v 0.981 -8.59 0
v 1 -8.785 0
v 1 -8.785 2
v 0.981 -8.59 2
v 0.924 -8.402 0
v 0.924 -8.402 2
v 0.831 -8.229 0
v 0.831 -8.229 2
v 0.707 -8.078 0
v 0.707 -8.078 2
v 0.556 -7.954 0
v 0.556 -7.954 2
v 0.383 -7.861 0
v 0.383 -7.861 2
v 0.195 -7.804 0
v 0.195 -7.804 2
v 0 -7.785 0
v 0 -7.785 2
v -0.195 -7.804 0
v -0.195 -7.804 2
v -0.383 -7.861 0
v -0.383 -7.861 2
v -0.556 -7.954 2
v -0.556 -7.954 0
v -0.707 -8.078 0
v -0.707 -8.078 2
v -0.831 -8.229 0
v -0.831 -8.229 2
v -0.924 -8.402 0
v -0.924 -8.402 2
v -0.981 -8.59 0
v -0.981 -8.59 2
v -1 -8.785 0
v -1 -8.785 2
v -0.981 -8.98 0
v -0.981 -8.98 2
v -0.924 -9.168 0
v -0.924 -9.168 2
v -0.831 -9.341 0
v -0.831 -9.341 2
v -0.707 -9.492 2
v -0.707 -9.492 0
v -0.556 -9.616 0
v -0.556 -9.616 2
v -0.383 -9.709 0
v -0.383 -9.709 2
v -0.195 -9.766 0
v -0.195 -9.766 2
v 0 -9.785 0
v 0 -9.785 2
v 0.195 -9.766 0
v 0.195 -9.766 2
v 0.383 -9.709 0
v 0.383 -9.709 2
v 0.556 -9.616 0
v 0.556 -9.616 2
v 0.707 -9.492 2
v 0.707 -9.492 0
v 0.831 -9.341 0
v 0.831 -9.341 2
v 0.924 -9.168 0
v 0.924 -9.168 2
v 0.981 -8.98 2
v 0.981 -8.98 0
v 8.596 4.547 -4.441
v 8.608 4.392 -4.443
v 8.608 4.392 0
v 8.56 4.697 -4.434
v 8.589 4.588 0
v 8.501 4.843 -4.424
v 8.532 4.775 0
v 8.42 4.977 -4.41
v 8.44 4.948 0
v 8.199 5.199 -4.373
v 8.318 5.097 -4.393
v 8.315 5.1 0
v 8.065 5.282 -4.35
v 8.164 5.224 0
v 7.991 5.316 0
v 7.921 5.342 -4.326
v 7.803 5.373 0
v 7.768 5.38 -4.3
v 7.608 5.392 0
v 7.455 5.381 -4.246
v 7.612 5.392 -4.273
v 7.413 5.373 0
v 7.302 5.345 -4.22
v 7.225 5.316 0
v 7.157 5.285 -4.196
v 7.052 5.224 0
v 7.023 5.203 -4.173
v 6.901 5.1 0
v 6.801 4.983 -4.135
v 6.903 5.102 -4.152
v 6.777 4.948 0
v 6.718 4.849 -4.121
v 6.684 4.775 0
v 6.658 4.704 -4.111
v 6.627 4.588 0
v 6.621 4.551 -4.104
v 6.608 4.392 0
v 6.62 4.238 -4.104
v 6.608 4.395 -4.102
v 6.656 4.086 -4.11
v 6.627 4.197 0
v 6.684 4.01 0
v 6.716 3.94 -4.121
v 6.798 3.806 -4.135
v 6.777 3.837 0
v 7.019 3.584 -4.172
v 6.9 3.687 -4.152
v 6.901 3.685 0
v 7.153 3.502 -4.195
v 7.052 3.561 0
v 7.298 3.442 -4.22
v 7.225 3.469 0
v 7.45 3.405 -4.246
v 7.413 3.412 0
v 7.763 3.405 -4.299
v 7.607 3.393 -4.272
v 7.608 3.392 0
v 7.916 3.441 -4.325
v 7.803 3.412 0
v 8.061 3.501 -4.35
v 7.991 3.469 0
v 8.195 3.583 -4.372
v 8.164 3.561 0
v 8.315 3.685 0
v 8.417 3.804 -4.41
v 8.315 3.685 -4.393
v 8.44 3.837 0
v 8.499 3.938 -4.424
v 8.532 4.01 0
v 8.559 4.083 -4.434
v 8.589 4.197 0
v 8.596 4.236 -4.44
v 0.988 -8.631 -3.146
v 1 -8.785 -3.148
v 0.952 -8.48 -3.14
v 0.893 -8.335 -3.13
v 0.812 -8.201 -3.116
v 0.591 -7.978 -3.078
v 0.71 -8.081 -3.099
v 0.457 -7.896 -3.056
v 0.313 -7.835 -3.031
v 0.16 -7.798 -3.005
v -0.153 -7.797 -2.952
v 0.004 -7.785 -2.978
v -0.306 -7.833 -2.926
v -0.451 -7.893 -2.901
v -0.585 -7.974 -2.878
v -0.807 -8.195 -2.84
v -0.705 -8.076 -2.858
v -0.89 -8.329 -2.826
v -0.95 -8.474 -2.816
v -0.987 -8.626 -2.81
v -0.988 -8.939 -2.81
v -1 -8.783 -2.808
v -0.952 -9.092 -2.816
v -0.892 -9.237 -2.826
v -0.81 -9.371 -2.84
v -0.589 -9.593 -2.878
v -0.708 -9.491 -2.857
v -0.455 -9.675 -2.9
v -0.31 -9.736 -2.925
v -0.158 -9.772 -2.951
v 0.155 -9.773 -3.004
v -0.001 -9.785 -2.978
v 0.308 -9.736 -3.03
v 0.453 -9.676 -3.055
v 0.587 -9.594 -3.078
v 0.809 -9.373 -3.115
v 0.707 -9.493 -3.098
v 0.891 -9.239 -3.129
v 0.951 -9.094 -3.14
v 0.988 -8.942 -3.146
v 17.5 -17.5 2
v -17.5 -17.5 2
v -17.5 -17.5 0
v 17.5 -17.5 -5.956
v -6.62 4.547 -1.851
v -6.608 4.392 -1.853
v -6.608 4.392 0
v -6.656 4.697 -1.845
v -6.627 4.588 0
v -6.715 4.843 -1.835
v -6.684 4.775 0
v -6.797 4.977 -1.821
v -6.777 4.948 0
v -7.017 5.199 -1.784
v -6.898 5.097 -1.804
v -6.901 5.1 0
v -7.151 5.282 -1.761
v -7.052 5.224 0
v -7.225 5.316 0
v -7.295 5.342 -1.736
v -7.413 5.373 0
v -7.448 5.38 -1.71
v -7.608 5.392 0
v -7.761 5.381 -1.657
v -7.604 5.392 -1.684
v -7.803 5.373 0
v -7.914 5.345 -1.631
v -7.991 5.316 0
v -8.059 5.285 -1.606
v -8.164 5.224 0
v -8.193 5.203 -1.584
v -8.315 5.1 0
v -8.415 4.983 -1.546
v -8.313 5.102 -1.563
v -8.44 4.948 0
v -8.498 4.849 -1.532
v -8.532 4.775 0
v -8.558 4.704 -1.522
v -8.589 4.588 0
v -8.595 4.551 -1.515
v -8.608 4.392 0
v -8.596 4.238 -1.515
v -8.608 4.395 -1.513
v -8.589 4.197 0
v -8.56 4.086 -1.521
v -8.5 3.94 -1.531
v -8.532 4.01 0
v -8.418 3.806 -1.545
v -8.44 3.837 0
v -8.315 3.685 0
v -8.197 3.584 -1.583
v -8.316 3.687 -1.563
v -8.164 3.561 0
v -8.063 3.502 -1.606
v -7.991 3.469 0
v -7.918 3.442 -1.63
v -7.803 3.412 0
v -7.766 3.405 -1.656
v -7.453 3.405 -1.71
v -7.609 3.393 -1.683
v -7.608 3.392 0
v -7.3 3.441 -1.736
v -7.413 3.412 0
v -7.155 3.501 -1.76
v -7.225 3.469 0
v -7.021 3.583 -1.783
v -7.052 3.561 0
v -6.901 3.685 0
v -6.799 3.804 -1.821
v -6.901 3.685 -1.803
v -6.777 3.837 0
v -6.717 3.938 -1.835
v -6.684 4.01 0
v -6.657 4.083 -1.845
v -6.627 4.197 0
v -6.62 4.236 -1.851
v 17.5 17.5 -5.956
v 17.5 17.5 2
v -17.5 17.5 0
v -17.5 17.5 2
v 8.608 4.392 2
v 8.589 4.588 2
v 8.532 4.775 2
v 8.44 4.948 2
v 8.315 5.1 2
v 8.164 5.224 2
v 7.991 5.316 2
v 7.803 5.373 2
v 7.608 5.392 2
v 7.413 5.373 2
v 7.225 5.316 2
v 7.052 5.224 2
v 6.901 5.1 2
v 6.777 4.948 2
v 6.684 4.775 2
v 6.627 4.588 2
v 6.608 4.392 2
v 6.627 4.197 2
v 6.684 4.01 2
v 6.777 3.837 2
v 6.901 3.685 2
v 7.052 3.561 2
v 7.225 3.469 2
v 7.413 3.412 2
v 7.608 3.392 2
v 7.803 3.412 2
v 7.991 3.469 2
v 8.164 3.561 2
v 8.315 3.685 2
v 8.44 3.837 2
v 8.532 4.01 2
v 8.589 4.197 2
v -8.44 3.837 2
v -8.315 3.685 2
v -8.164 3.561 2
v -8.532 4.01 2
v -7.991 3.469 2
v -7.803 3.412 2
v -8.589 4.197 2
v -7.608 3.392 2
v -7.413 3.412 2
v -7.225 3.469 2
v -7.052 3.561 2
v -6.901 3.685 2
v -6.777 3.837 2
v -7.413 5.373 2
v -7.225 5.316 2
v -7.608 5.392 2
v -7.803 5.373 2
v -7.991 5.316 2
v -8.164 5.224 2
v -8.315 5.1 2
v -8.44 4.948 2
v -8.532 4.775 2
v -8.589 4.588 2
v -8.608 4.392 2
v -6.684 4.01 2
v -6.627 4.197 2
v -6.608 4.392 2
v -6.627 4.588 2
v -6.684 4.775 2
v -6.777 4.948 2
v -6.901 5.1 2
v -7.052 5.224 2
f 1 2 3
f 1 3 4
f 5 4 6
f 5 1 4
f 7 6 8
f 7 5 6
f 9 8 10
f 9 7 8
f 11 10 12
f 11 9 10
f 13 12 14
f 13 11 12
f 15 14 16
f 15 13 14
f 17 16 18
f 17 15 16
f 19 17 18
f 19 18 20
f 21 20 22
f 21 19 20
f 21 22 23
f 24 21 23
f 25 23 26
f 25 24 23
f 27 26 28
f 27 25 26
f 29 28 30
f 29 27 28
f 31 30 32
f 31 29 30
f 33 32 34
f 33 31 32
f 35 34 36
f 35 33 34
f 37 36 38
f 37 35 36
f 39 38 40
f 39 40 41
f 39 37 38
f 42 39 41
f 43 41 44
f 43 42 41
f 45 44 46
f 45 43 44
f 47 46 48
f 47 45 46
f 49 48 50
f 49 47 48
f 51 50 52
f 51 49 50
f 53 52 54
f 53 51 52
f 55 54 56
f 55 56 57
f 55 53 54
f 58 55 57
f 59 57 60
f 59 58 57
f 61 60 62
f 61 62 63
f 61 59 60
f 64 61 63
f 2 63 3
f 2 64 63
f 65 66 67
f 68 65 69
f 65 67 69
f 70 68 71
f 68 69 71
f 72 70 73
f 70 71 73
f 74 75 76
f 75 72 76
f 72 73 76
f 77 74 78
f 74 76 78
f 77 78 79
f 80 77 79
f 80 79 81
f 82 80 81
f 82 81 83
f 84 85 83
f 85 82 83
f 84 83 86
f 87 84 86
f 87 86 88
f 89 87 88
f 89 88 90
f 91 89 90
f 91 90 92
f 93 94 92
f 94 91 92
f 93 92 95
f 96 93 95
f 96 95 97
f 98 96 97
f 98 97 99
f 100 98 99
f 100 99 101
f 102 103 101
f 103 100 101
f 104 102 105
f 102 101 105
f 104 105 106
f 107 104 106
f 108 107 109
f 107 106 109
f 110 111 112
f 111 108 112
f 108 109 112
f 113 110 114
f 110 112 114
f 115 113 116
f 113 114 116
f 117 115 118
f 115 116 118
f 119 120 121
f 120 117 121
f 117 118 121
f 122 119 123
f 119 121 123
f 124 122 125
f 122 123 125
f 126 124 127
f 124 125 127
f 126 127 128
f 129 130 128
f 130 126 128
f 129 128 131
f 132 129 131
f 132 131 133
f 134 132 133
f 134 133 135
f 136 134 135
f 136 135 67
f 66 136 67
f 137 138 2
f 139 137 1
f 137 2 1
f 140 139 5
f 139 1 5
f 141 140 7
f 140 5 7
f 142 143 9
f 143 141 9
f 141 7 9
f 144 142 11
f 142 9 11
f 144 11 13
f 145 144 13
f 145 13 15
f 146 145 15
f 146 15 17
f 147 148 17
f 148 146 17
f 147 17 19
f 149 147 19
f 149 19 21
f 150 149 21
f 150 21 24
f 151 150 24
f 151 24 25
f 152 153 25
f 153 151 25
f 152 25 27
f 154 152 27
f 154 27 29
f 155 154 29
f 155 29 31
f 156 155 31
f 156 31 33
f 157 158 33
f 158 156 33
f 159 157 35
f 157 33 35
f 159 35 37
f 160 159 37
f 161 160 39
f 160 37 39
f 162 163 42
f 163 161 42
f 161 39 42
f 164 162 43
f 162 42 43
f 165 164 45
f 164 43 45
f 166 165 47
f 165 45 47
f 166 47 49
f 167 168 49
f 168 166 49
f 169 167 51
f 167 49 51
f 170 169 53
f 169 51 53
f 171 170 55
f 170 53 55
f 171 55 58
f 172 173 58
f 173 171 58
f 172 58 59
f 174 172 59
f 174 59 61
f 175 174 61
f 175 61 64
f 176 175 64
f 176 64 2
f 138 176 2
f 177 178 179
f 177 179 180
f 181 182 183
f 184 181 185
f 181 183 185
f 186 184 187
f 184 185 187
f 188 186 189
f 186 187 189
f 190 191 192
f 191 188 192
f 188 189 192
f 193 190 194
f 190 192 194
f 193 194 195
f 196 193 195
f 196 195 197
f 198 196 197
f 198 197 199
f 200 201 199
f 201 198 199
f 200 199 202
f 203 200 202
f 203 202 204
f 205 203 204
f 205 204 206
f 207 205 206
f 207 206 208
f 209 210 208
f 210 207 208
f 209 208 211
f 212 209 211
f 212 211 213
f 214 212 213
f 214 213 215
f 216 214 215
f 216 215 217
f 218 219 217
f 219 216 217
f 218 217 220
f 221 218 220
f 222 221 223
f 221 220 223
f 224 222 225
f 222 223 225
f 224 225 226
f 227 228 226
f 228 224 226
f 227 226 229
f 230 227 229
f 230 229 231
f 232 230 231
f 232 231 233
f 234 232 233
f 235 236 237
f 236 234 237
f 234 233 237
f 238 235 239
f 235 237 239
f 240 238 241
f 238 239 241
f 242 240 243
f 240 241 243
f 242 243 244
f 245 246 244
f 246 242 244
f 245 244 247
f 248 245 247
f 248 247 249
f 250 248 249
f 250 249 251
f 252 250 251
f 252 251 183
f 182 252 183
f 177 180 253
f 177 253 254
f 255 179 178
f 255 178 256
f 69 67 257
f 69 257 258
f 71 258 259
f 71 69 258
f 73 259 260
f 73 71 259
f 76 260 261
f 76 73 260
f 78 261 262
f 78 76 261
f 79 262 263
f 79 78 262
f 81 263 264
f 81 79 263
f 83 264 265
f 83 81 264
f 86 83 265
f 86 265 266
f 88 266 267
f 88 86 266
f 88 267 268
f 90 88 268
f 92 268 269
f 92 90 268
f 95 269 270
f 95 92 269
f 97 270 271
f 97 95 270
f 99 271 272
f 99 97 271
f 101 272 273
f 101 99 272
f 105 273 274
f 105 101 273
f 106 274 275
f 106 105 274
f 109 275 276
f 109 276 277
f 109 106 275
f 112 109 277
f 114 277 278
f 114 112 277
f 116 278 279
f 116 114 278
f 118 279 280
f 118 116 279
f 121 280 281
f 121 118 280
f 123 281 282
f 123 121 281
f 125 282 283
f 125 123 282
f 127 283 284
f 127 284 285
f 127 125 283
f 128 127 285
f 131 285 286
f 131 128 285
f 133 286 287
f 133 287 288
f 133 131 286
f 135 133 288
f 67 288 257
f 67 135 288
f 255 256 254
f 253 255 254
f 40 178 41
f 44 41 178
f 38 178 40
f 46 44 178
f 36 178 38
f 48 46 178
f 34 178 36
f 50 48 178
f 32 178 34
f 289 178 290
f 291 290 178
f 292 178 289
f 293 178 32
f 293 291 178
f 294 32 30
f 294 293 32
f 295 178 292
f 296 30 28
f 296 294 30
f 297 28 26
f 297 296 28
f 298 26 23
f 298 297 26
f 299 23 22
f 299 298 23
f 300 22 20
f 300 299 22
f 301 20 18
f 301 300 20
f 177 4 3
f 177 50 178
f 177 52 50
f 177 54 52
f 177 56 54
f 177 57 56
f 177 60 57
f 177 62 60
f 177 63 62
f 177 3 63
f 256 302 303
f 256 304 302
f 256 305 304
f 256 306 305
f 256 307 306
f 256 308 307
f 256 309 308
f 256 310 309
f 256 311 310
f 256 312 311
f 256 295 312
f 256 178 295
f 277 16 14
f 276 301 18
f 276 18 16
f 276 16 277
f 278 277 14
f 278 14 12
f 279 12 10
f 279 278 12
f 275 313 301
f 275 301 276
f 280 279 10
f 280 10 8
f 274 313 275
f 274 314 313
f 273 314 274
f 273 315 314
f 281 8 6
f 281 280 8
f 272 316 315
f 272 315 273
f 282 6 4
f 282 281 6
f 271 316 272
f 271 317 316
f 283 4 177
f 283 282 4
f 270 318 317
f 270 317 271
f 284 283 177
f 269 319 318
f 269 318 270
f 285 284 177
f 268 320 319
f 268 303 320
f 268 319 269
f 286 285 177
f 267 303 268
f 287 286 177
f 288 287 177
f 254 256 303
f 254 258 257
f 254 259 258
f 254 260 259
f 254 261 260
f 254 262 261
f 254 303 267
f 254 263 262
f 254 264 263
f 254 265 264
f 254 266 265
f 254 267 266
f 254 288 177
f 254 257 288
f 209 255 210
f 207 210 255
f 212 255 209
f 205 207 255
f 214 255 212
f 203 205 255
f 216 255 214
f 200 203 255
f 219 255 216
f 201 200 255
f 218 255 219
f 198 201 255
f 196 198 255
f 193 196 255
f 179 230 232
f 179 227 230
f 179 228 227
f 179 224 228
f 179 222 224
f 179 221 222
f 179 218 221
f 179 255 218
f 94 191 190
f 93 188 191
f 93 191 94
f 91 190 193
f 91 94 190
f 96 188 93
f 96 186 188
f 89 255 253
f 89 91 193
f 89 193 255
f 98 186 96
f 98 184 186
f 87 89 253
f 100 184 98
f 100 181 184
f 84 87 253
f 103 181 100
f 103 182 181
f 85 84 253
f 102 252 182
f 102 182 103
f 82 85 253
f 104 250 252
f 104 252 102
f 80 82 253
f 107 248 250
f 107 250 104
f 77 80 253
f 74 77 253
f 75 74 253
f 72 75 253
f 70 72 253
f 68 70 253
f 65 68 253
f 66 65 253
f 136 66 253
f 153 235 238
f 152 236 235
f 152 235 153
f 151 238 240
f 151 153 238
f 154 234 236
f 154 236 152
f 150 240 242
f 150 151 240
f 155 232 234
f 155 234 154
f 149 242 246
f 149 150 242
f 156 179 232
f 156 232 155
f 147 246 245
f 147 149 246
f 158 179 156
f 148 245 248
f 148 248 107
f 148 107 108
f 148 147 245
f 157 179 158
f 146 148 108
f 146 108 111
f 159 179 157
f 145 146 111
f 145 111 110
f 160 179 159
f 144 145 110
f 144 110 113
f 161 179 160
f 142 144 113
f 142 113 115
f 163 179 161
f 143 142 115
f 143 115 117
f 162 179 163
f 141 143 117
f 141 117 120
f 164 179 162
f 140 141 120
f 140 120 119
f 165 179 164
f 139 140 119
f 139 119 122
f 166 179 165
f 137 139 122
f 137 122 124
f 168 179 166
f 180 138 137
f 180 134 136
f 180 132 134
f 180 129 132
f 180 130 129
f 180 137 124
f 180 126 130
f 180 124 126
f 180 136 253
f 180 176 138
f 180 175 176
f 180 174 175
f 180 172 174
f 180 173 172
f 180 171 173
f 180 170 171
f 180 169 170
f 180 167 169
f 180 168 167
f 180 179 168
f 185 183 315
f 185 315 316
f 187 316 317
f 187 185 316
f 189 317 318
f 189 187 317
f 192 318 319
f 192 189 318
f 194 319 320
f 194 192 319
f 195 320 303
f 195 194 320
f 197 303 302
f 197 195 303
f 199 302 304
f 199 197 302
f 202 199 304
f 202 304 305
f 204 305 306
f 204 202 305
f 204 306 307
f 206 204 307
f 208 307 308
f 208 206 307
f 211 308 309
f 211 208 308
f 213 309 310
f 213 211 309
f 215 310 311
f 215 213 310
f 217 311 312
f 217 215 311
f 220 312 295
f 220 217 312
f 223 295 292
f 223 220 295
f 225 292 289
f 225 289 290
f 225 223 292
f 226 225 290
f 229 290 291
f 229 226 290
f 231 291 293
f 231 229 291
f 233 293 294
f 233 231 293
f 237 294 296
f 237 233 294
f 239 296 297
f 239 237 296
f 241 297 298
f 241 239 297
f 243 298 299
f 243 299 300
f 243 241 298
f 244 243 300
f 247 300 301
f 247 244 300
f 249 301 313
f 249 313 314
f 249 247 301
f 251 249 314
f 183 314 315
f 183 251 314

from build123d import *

# Parameters (mm, degrees)
F0_W     = 35
F0_H     = 35
F0_R     = 11.285
F0_R_2   = 1
F1_DEPTH = 2
F3_DEPTH = 35
F4_DEPTH = 25


with BuildPart() as f1:
    # F0 (on Top) → F1 (new body)
    with BuildSketch(Plane.XY):
        Rectangle(F0_W, F0_H)
        Circle(F0_R, mode=Mode.SUBTRACT)
        Circle(F0_R)
        with Locations((0, -8.785)):
            Circle(F0_R_2, mode=Mode.SUBTRACT)
        with Locations((-7.6080331722, 4.3925)):
            Circle(F0_R_2, mode=Mode.SUBTRACT)
        with Locations((7.6080331722, 4.3925)):
            Circle(F0_R_2, mode=Mode.SUBTRACT)
    extrude(amount=F1_DEPTH)

    # F2 (on face) → F3 (join, through all)
    with BuildSketch(Plane.XZ.offset(17.5)):
        Polygon((17.5, -5.9556164779), (17.5, 0), (-17.5, 0), align=None)
    extrude(amount=-F3_DEPTH)

    # F4 (cut): faces of the model
    f4_faces = [f1.faces().sort_by_distance(p)[0] for p in [
        (7.6080331722, 4.3925, 0),
        (0, -8.785, 0),
        (-7.6080331722, 4.3925, 0),
    ]]
    extrude(f4_faces, amount=-F4_DEPTH, mode=Mode.SUBTRACT)


solid = f1.part
